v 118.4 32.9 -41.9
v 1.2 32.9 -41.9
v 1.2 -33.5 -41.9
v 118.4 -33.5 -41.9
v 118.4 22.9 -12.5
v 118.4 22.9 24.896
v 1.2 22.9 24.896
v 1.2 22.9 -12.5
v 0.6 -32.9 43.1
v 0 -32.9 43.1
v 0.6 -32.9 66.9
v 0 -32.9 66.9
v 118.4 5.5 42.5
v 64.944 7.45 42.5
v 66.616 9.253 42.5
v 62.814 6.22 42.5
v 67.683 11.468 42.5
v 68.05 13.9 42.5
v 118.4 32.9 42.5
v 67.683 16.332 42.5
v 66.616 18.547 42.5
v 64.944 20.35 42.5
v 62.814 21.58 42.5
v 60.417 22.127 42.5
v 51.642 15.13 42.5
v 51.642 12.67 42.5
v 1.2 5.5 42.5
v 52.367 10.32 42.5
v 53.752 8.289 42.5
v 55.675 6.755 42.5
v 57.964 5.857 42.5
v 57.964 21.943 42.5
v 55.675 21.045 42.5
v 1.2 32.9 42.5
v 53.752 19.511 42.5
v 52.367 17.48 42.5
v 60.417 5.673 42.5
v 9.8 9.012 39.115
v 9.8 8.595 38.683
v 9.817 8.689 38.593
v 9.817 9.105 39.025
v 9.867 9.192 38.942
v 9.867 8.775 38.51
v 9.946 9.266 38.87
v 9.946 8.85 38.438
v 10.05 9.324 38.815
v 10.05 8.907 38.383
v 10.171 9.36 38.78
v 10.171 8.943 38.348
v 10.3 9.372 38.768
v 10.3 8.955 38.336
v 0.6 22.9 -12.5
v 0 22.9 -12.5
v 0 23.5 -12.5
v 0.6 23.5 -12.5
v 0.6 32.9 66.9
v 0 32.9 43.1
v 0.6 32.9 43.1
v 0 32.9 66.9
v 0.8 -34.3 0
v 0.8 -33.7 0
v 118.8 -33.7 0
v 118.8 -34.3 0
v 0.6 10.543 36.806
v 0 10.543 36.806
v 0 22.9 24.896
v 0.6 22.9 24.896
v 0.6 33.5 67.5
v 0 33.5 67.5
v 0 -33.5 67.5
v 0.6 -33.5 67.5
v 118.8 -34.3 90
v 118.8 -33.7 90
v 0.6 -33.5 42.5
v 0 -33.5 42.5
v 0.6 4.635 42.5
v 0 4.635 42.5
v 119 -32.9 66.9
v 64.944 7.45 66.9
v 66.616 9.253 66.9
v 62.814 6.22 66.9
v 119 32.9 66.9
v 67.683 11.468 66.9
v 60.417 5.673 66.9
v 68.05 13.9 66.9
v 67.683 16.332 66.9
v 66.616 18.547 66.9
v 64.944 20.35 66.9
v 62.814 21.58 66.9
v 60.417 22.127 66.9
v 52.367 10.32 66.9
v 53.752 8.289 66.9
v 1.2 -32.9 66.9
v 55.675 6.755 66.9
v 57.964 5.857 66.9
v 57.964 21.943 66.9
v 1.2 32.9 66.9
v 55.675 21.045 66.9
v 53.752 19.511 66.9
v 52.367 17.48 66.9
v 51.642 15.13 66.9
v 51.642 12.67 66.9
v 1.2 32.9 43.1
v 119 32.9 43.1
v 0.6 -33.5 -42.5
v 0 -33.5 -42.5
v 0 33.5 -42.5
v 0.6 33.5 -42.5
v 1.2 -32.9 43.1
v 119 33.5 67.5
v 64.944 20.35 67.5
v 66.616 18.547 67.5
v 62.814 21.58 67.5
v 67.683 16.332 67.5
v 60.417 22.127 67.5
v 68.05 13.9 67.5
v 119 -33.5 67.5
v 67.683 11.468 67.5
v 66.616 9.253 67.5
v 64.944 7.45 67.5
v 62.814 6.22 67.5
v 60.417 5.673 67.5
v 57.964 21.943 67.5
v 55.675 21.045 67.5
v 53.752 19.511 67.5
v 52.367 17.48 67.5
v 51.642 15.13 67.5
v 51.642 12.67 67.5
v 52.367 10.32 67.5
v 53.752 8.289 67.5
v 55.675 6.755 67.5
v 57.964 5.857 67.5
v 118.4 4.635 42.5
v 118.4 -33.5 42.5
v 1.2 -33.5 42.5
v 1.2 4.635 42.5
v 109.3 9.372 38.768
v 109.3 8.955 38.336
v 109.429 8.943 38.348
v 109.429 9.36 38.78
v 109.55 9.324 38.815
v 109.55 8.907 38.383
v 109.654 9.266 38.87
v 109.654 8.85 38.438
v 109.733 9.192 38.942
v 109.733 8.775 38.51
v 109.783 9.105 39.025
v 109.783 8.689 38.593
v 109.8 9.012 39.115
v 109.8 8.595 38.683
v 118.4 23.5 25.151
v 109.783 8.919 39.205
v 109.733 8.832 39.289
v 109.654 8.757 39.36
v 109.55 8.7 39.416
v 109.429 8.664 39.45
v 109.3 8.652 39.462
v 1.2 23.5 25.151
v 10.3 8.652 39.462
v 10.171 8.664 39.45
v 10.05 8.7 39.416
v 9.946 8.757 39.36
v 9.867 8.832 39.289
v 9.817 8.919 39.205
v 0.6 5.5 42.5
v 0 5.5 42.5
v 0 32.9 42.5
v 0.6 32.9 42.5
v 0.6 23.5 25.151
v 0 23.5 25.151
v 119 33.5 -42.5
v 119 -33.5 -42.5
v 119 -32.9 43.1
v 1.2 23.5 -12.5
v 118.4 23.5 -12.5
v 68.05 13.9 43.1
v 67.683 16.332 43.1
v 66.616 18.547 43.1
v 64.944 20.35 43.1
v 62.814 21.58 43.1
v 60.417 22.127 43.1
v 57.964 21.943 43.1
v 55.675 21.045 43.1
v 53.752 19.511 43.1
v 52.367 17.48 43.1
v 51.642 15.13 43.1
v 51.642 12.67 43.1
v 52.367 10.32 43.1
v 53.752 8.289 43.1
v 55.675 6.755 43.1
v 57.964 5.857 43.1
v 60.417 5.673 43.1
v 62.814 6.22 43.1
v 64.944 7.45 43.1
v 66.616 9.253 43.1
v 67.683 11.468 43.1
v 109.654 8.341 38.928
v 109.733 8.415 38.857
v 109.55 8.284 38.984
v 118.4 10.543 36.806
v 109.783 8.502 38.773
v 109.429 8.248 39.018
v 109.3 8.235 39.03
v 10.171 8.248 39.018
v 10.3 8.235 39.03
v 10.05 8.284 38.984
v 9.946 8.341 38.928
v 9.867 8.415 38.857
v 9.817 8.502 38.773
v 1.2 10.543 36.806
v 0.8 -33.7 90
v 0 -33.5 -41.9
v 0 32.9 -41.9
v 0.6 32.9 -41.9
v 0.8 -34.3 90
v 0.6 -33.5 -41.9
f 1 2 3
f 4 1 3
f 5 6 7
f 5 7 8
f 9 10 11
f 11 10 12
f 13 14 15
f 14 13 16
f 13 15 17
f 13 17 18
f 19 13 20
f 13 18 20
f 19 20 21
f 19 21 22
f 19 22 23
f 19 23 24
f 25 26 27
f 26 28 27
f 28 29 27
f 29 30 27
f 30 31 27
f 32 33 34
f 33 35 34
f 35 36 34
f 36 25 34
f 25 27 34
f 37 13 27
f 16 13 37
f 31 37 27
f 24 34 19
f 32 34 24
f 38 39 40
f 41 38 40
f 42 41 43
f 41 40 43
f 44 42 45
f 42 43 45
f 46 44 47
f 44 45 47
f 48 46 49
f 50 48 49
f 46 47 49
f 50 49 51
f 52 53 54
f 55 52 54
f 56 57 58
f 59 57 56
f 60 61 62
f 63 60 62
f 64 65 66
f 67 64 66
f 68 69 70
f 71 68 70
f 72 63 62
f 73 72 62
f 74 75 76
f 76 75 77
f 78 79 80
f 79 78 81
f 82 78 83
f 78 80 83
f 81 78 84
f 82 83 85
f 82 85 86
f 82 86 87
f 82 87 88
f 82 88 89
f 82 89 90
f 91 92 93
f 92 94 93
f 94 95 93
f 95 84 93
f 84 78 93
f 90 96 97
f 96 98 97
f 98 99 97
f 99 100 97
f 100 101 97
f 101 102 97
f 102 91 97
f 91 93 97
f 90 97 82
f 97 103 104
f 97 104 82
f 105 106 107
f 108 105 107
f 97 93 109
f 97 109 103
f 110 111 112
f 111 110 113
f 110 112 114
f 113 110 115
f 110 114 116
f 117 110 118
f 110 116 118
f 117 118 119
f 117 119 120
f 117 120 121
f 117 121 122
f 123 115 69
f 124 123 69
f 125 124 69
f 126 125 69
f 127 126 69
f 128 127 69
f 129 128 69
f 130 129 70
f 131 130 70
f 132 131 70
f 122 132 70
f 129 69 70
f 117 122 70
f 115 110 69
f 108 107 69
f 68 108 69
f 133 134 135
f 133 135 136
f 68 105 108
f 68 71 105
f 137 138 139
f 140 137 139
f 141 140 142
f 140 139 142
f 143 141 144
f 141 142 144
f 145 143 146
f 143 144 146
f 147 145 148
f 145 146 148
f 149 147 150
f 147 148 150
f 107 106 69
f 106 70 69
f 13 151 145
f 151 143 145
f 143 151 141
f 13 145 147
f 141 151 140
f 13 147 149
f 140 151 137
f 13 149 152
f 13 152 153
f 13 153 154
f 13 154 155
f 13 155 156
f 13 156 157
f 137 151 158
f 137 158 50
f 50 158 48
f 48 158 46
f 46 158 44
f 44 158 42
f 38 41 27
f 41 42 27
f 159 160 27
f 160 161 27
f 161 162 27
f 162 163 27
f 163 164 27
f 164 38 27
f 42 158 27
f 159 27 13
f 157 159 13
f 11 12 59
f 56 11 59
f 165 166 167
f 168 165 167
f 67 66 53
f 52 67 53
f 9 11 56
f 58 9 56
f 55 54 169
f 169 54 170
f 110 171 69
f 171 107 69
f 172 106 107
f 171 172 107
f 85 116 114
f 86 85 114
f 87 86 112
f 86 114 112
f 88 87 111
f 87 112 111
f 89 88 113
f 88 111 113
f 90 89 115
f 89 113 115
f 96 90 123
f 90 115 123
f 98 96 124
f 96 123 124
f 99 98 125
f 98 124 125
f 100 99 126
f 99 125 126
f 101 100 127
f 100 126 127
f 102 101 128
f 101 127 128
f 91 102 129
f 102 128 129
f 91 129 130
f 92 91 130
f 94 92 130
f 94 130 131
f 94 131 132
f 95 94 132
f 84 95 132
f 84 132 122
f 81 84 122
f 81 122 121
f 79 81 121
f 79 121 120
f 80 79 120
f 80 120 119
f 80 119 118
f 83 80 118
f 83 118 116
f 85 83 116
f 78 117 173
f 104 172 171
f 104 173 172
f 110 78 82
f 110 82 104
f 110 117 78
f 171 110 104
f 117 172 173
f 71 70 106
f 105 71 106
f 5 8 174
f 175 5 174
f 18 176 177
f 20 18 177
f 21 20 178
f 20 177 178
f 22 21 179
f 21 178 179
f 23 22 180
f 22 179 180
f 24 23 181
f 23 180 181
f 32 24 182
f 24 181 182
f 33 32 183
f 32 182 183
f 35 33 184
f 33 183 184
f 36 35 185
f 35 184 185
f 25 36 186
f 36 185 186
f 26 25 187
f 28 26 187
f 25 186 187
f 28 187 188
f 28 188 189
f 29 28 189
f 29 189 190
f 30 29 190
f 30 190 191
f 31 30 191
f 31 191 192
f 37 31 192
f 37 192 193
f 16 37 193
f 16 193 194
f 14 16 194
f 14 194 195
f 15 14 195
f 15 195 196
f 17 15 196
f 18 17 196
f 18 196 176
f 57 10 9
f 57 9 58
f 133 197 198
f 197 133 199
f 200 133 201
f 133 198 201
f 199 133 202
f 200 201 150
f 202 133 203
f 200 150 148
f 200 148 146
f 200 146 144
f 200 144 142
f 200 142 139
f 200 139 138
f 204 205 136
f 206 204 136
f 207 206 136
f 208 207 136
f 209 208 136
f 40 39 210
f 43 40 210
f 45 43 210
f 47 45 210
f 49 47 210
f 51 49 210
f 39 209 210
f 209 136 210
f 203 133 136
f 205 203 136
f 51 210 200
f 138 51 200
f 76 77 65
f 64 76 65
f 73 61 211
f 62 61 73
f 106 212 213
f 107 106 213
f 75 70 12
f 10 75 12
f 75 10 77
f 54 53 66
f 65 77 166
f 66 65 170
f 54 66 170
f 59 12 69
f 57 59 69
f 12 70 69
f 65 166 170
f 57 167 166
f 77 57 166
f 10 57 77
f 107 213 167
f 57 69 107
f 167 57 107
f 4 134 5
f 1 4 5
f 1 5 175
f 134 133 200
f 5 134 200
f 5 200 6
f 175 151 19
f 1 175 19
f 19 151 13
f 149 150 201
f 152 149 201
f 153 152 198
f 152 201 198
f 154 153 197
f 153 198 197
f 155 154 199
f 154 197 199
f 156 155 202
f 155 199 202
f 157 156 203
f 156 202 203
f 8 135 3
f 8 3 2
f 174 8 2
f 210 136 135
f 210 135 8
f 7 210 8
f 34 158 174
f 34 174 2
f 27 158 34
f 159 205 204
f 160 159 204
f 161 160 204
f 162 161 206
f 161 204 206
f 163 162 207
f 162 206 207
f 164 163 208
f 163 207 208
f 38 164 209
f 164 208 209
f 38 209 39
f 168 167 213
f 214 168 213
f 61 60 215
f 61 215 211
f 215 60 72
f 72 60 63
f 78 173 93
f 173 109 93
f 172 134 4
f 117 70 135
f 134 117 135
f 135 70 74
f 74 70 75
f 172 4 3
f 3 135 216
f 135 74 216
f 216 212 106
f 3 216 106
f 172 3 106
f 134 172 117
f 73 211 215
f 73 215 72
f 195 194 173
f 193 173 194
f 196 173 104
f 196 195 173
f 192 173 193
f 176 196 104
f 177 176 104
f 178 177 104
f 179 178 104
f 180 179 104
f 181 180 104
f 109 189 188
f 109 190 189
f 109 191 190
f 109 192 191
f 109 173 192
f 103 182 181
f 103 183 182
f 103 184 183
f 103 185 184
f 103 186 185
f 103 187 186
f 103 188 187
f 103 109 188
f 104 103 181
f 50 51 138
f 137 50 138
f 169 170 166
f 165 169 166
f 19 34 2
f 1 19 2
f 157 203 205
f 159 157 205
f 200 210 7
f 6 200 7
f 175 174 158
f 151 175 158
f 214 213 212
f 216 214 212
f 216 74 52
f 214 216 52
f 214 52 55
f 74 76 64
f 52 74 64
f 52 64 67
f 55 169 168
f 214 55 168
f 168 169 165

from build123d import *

# Parameters (mm, degrees)
F0_W      = 65.8
F0_H      = 23.8
F1_DEPTH  = 118.4
F2_DEPTH  = 0.6
F3_W      = 65.8
F3_H      = 23.8
F2_FACE_W = 67
F2_FACE_H = 110
F4_DEPTH  = 0.6
F7_DEPTH  = 1
F8_W      = 118
F8_H      = 0.6
F9_DEPTH  = 90
F10_DEPTH = 25


# Not quite as in the source:
# - a feature names something its author has since deleted; it is built from what else it names


with BuildPart() as f1:
    # F0 (on Right) → F1 (new body)
    with BuildSketch(Plane.YZ):
        Polygon((5.5, 42.5), (4.6354143734, 42.5), (10.5434493031, 36.8055236056), (22.9, 24.8956268129), (22.9, -12.5), (23.5, -12.5), (23.5, 25.1506484271), align=None)
        Polygon((-33.5, -42.5), (33.5, -42.5), (33.5, 42.5), (33.5, 67.5), (-33.5, 67.5), (-33.5, 43.1), (-33.5, 42.5), (4.6354143734, 42.5), (5.5, 42.5), (32.9, 42.5), (32.9, -41.9), (-32.9, -41.9), (-33.5, -41.9), align=None)
        with Locations((0, 55)):
            Rectangle(F0_W, F0_H, mode=Mode.SUBTRACT)
    extrude(amount=F1_DEPTH)

    # F3 (on face) + F0 (on Right) + F2_face (on face) → F4 (join)
    with BuildSketch(Plane.YZ.offset(118.4)):
        Polygon((-33.5, -42.5), (33.5, -42.5), (33.5, 42.5), (33.5, 67.5), (-33.5, 67.5), (-33.5, 42.5), (4.6354143734, 42.5), (22.9, 24.8956268129), (22.9, -12.5), (23.5, -12.5), (23.5, 25.1506484271), (5.5, 42.5), (32.9, 42.5), (32.9, -41.9), (-33.5, -41.9), align=None)
        with Locations((0, 55)):
            Rectangle(F3_W, F3_H, mode=Mode.SUBTRACT)
        Polygon((-33.5, 42.5), (-33.5, -41.9), (32.9, -41.9), (32.9, 42.5), (5.5, 42.5), (23.5, 25.1506484271), (23.5, -12.5), (22.9, -12.5), (22.9, 24.8956268129), (4.6354143734, 42.5), align=None)
    with BuildSketch(Plane.YZ):
        Polygon((-33.5, -42.5), (33.5, -42.5), (33.5, 42.5), (33.5, 67.5), (-33.5, 67.5), (-33.5, 43.1), (-33.5, 42.5), (4.6354143734, 42.5), (5.5, 42.5), (32.9, 42.5), (32.9, -41.9), (-32.9, -41.9), (-33.5, -41.9), align=None)
        with Locations((0, 55)):
            Rectangle(F0_W, F0_H, mode=Mode.SUBTRACT)
    with BuildSketch(Plane(origin=(0.6, 0, 12.5), x_dir=(0, 1, 0), z_dir=(1, 0, 0))):
        Rectangle(F2_FACE_W, F2_FACE_H)
    extrude(amount=F4_DEPTH)

    # F6 (on face) → F7 (cut)
    with BuildSketch(Plane(origin=(0, 23.4680218875, 24.3481372891), x_dir=(1, 0, 0), z_dir=(0, -0.6939740629, -0.72))):
        with BuildLine():
            Line((10.3, 20.156399325), (109.3, 20.156399325))
            ThreePointArc((109.3, 20.156399325), (109.6535533906, 20.3028459345), (109.8, 20.656399325))
            ThreePointArc((109.8, 20.656399325), (109.6535533906, 21.0099527156), (109.3, 21.156399325))
            Line((109.3, 21.156399325), (10.3, 21.156399325))
            ThreePointArc((10.3, 21.156399325), (9.9464466094, 21.0099527156), (9.8, 20.656399325))
            ThreePointArc((9.8, 20.656399325), (9.9464466094, 20.3028459345), (10.3, 20.156399325))
        make_face()
    extrude(amount=-F7_DEPTH, mode=Mode.SUBTRACT)

    # F5 (on face) → F10 (cut)
    with BuildSketch(Plane.XY.offset(67.5)):
        with BuildLine():
            ThreePointArc((51.55, 13.8999999701), (59.8000000075, 5.649999985), (68.05, 13.899999985))
            Line((68.05, 13.8999999701), (51.55, 13.8999999701))
        make_face()
        with BuildLine():
            Line((51.55, 13.8999999701), (68.05, 13.8999999701))
            ThreePointArc((68.05, 13.899999985), (59.7999999925, 22.149999985), (51.55, 13.8999999701))
        make_face()
    extrude(amount=-F10_DEPTH, mode=Mode.SUBTRACT)


with BuildPart() as f2:
    # F0 (on Right) → F2 (new body)
    with BuildSketch(Plane.YZ):
        Polygon((-33.5, 42.5), (-33.5, -41.9), (-32.9, -41.9), (32.9, -41.9), (32.9, 42.5), (5.5, 42.5), (23.5, 25.1506484271), (23.5, -12.5), (22.9, -12.5), (22.9, 24.8956268129), (10.5434493031, 36.8055236056), (4.6354143734, 42.5), align=None)
        Polygon((-33.5, -42.5), (33.5, -42.5), (33.5, 42.5), (33.5, 67.5), (-33.5, 67.5), (-33.5, 43.1), (-33.5, 42.5), (4.6354143734, 42.5), (5.5, 42.5), (32.9, 42.5), (32.9, -41.9), (-32.9, -41.9), (-33.5, -41.9), align=None)
        with Locations((0, 55)):
            Rectangle(F0_W, F0_H, mode=Mode.SUBTRACT)
        with Locations((0, 55)):
            Rectangle(F0_W, F0_H)
        Polygon((5.5, 42.5), (4.6354143734, 42.5), (10.5434493031, 36.8055236056), (22.9, 24.8956268129), (22.9, -12.5), (23.5, -12.5), (23.5, 25.1506484271), align=None)
    extrude(amount=F2_DEPTH)


with BuildPart() as f9:
    # F8 (on Top) → F9 (new body)
    with BuildSketch(Plane.XY):
        with Locations((59.8, -34)):
            Rectangle(F8_W, F8_H)
    extrude(amount=F9_DEPTH)


solid = Compound([f1.part, f2.part, f9.part])
